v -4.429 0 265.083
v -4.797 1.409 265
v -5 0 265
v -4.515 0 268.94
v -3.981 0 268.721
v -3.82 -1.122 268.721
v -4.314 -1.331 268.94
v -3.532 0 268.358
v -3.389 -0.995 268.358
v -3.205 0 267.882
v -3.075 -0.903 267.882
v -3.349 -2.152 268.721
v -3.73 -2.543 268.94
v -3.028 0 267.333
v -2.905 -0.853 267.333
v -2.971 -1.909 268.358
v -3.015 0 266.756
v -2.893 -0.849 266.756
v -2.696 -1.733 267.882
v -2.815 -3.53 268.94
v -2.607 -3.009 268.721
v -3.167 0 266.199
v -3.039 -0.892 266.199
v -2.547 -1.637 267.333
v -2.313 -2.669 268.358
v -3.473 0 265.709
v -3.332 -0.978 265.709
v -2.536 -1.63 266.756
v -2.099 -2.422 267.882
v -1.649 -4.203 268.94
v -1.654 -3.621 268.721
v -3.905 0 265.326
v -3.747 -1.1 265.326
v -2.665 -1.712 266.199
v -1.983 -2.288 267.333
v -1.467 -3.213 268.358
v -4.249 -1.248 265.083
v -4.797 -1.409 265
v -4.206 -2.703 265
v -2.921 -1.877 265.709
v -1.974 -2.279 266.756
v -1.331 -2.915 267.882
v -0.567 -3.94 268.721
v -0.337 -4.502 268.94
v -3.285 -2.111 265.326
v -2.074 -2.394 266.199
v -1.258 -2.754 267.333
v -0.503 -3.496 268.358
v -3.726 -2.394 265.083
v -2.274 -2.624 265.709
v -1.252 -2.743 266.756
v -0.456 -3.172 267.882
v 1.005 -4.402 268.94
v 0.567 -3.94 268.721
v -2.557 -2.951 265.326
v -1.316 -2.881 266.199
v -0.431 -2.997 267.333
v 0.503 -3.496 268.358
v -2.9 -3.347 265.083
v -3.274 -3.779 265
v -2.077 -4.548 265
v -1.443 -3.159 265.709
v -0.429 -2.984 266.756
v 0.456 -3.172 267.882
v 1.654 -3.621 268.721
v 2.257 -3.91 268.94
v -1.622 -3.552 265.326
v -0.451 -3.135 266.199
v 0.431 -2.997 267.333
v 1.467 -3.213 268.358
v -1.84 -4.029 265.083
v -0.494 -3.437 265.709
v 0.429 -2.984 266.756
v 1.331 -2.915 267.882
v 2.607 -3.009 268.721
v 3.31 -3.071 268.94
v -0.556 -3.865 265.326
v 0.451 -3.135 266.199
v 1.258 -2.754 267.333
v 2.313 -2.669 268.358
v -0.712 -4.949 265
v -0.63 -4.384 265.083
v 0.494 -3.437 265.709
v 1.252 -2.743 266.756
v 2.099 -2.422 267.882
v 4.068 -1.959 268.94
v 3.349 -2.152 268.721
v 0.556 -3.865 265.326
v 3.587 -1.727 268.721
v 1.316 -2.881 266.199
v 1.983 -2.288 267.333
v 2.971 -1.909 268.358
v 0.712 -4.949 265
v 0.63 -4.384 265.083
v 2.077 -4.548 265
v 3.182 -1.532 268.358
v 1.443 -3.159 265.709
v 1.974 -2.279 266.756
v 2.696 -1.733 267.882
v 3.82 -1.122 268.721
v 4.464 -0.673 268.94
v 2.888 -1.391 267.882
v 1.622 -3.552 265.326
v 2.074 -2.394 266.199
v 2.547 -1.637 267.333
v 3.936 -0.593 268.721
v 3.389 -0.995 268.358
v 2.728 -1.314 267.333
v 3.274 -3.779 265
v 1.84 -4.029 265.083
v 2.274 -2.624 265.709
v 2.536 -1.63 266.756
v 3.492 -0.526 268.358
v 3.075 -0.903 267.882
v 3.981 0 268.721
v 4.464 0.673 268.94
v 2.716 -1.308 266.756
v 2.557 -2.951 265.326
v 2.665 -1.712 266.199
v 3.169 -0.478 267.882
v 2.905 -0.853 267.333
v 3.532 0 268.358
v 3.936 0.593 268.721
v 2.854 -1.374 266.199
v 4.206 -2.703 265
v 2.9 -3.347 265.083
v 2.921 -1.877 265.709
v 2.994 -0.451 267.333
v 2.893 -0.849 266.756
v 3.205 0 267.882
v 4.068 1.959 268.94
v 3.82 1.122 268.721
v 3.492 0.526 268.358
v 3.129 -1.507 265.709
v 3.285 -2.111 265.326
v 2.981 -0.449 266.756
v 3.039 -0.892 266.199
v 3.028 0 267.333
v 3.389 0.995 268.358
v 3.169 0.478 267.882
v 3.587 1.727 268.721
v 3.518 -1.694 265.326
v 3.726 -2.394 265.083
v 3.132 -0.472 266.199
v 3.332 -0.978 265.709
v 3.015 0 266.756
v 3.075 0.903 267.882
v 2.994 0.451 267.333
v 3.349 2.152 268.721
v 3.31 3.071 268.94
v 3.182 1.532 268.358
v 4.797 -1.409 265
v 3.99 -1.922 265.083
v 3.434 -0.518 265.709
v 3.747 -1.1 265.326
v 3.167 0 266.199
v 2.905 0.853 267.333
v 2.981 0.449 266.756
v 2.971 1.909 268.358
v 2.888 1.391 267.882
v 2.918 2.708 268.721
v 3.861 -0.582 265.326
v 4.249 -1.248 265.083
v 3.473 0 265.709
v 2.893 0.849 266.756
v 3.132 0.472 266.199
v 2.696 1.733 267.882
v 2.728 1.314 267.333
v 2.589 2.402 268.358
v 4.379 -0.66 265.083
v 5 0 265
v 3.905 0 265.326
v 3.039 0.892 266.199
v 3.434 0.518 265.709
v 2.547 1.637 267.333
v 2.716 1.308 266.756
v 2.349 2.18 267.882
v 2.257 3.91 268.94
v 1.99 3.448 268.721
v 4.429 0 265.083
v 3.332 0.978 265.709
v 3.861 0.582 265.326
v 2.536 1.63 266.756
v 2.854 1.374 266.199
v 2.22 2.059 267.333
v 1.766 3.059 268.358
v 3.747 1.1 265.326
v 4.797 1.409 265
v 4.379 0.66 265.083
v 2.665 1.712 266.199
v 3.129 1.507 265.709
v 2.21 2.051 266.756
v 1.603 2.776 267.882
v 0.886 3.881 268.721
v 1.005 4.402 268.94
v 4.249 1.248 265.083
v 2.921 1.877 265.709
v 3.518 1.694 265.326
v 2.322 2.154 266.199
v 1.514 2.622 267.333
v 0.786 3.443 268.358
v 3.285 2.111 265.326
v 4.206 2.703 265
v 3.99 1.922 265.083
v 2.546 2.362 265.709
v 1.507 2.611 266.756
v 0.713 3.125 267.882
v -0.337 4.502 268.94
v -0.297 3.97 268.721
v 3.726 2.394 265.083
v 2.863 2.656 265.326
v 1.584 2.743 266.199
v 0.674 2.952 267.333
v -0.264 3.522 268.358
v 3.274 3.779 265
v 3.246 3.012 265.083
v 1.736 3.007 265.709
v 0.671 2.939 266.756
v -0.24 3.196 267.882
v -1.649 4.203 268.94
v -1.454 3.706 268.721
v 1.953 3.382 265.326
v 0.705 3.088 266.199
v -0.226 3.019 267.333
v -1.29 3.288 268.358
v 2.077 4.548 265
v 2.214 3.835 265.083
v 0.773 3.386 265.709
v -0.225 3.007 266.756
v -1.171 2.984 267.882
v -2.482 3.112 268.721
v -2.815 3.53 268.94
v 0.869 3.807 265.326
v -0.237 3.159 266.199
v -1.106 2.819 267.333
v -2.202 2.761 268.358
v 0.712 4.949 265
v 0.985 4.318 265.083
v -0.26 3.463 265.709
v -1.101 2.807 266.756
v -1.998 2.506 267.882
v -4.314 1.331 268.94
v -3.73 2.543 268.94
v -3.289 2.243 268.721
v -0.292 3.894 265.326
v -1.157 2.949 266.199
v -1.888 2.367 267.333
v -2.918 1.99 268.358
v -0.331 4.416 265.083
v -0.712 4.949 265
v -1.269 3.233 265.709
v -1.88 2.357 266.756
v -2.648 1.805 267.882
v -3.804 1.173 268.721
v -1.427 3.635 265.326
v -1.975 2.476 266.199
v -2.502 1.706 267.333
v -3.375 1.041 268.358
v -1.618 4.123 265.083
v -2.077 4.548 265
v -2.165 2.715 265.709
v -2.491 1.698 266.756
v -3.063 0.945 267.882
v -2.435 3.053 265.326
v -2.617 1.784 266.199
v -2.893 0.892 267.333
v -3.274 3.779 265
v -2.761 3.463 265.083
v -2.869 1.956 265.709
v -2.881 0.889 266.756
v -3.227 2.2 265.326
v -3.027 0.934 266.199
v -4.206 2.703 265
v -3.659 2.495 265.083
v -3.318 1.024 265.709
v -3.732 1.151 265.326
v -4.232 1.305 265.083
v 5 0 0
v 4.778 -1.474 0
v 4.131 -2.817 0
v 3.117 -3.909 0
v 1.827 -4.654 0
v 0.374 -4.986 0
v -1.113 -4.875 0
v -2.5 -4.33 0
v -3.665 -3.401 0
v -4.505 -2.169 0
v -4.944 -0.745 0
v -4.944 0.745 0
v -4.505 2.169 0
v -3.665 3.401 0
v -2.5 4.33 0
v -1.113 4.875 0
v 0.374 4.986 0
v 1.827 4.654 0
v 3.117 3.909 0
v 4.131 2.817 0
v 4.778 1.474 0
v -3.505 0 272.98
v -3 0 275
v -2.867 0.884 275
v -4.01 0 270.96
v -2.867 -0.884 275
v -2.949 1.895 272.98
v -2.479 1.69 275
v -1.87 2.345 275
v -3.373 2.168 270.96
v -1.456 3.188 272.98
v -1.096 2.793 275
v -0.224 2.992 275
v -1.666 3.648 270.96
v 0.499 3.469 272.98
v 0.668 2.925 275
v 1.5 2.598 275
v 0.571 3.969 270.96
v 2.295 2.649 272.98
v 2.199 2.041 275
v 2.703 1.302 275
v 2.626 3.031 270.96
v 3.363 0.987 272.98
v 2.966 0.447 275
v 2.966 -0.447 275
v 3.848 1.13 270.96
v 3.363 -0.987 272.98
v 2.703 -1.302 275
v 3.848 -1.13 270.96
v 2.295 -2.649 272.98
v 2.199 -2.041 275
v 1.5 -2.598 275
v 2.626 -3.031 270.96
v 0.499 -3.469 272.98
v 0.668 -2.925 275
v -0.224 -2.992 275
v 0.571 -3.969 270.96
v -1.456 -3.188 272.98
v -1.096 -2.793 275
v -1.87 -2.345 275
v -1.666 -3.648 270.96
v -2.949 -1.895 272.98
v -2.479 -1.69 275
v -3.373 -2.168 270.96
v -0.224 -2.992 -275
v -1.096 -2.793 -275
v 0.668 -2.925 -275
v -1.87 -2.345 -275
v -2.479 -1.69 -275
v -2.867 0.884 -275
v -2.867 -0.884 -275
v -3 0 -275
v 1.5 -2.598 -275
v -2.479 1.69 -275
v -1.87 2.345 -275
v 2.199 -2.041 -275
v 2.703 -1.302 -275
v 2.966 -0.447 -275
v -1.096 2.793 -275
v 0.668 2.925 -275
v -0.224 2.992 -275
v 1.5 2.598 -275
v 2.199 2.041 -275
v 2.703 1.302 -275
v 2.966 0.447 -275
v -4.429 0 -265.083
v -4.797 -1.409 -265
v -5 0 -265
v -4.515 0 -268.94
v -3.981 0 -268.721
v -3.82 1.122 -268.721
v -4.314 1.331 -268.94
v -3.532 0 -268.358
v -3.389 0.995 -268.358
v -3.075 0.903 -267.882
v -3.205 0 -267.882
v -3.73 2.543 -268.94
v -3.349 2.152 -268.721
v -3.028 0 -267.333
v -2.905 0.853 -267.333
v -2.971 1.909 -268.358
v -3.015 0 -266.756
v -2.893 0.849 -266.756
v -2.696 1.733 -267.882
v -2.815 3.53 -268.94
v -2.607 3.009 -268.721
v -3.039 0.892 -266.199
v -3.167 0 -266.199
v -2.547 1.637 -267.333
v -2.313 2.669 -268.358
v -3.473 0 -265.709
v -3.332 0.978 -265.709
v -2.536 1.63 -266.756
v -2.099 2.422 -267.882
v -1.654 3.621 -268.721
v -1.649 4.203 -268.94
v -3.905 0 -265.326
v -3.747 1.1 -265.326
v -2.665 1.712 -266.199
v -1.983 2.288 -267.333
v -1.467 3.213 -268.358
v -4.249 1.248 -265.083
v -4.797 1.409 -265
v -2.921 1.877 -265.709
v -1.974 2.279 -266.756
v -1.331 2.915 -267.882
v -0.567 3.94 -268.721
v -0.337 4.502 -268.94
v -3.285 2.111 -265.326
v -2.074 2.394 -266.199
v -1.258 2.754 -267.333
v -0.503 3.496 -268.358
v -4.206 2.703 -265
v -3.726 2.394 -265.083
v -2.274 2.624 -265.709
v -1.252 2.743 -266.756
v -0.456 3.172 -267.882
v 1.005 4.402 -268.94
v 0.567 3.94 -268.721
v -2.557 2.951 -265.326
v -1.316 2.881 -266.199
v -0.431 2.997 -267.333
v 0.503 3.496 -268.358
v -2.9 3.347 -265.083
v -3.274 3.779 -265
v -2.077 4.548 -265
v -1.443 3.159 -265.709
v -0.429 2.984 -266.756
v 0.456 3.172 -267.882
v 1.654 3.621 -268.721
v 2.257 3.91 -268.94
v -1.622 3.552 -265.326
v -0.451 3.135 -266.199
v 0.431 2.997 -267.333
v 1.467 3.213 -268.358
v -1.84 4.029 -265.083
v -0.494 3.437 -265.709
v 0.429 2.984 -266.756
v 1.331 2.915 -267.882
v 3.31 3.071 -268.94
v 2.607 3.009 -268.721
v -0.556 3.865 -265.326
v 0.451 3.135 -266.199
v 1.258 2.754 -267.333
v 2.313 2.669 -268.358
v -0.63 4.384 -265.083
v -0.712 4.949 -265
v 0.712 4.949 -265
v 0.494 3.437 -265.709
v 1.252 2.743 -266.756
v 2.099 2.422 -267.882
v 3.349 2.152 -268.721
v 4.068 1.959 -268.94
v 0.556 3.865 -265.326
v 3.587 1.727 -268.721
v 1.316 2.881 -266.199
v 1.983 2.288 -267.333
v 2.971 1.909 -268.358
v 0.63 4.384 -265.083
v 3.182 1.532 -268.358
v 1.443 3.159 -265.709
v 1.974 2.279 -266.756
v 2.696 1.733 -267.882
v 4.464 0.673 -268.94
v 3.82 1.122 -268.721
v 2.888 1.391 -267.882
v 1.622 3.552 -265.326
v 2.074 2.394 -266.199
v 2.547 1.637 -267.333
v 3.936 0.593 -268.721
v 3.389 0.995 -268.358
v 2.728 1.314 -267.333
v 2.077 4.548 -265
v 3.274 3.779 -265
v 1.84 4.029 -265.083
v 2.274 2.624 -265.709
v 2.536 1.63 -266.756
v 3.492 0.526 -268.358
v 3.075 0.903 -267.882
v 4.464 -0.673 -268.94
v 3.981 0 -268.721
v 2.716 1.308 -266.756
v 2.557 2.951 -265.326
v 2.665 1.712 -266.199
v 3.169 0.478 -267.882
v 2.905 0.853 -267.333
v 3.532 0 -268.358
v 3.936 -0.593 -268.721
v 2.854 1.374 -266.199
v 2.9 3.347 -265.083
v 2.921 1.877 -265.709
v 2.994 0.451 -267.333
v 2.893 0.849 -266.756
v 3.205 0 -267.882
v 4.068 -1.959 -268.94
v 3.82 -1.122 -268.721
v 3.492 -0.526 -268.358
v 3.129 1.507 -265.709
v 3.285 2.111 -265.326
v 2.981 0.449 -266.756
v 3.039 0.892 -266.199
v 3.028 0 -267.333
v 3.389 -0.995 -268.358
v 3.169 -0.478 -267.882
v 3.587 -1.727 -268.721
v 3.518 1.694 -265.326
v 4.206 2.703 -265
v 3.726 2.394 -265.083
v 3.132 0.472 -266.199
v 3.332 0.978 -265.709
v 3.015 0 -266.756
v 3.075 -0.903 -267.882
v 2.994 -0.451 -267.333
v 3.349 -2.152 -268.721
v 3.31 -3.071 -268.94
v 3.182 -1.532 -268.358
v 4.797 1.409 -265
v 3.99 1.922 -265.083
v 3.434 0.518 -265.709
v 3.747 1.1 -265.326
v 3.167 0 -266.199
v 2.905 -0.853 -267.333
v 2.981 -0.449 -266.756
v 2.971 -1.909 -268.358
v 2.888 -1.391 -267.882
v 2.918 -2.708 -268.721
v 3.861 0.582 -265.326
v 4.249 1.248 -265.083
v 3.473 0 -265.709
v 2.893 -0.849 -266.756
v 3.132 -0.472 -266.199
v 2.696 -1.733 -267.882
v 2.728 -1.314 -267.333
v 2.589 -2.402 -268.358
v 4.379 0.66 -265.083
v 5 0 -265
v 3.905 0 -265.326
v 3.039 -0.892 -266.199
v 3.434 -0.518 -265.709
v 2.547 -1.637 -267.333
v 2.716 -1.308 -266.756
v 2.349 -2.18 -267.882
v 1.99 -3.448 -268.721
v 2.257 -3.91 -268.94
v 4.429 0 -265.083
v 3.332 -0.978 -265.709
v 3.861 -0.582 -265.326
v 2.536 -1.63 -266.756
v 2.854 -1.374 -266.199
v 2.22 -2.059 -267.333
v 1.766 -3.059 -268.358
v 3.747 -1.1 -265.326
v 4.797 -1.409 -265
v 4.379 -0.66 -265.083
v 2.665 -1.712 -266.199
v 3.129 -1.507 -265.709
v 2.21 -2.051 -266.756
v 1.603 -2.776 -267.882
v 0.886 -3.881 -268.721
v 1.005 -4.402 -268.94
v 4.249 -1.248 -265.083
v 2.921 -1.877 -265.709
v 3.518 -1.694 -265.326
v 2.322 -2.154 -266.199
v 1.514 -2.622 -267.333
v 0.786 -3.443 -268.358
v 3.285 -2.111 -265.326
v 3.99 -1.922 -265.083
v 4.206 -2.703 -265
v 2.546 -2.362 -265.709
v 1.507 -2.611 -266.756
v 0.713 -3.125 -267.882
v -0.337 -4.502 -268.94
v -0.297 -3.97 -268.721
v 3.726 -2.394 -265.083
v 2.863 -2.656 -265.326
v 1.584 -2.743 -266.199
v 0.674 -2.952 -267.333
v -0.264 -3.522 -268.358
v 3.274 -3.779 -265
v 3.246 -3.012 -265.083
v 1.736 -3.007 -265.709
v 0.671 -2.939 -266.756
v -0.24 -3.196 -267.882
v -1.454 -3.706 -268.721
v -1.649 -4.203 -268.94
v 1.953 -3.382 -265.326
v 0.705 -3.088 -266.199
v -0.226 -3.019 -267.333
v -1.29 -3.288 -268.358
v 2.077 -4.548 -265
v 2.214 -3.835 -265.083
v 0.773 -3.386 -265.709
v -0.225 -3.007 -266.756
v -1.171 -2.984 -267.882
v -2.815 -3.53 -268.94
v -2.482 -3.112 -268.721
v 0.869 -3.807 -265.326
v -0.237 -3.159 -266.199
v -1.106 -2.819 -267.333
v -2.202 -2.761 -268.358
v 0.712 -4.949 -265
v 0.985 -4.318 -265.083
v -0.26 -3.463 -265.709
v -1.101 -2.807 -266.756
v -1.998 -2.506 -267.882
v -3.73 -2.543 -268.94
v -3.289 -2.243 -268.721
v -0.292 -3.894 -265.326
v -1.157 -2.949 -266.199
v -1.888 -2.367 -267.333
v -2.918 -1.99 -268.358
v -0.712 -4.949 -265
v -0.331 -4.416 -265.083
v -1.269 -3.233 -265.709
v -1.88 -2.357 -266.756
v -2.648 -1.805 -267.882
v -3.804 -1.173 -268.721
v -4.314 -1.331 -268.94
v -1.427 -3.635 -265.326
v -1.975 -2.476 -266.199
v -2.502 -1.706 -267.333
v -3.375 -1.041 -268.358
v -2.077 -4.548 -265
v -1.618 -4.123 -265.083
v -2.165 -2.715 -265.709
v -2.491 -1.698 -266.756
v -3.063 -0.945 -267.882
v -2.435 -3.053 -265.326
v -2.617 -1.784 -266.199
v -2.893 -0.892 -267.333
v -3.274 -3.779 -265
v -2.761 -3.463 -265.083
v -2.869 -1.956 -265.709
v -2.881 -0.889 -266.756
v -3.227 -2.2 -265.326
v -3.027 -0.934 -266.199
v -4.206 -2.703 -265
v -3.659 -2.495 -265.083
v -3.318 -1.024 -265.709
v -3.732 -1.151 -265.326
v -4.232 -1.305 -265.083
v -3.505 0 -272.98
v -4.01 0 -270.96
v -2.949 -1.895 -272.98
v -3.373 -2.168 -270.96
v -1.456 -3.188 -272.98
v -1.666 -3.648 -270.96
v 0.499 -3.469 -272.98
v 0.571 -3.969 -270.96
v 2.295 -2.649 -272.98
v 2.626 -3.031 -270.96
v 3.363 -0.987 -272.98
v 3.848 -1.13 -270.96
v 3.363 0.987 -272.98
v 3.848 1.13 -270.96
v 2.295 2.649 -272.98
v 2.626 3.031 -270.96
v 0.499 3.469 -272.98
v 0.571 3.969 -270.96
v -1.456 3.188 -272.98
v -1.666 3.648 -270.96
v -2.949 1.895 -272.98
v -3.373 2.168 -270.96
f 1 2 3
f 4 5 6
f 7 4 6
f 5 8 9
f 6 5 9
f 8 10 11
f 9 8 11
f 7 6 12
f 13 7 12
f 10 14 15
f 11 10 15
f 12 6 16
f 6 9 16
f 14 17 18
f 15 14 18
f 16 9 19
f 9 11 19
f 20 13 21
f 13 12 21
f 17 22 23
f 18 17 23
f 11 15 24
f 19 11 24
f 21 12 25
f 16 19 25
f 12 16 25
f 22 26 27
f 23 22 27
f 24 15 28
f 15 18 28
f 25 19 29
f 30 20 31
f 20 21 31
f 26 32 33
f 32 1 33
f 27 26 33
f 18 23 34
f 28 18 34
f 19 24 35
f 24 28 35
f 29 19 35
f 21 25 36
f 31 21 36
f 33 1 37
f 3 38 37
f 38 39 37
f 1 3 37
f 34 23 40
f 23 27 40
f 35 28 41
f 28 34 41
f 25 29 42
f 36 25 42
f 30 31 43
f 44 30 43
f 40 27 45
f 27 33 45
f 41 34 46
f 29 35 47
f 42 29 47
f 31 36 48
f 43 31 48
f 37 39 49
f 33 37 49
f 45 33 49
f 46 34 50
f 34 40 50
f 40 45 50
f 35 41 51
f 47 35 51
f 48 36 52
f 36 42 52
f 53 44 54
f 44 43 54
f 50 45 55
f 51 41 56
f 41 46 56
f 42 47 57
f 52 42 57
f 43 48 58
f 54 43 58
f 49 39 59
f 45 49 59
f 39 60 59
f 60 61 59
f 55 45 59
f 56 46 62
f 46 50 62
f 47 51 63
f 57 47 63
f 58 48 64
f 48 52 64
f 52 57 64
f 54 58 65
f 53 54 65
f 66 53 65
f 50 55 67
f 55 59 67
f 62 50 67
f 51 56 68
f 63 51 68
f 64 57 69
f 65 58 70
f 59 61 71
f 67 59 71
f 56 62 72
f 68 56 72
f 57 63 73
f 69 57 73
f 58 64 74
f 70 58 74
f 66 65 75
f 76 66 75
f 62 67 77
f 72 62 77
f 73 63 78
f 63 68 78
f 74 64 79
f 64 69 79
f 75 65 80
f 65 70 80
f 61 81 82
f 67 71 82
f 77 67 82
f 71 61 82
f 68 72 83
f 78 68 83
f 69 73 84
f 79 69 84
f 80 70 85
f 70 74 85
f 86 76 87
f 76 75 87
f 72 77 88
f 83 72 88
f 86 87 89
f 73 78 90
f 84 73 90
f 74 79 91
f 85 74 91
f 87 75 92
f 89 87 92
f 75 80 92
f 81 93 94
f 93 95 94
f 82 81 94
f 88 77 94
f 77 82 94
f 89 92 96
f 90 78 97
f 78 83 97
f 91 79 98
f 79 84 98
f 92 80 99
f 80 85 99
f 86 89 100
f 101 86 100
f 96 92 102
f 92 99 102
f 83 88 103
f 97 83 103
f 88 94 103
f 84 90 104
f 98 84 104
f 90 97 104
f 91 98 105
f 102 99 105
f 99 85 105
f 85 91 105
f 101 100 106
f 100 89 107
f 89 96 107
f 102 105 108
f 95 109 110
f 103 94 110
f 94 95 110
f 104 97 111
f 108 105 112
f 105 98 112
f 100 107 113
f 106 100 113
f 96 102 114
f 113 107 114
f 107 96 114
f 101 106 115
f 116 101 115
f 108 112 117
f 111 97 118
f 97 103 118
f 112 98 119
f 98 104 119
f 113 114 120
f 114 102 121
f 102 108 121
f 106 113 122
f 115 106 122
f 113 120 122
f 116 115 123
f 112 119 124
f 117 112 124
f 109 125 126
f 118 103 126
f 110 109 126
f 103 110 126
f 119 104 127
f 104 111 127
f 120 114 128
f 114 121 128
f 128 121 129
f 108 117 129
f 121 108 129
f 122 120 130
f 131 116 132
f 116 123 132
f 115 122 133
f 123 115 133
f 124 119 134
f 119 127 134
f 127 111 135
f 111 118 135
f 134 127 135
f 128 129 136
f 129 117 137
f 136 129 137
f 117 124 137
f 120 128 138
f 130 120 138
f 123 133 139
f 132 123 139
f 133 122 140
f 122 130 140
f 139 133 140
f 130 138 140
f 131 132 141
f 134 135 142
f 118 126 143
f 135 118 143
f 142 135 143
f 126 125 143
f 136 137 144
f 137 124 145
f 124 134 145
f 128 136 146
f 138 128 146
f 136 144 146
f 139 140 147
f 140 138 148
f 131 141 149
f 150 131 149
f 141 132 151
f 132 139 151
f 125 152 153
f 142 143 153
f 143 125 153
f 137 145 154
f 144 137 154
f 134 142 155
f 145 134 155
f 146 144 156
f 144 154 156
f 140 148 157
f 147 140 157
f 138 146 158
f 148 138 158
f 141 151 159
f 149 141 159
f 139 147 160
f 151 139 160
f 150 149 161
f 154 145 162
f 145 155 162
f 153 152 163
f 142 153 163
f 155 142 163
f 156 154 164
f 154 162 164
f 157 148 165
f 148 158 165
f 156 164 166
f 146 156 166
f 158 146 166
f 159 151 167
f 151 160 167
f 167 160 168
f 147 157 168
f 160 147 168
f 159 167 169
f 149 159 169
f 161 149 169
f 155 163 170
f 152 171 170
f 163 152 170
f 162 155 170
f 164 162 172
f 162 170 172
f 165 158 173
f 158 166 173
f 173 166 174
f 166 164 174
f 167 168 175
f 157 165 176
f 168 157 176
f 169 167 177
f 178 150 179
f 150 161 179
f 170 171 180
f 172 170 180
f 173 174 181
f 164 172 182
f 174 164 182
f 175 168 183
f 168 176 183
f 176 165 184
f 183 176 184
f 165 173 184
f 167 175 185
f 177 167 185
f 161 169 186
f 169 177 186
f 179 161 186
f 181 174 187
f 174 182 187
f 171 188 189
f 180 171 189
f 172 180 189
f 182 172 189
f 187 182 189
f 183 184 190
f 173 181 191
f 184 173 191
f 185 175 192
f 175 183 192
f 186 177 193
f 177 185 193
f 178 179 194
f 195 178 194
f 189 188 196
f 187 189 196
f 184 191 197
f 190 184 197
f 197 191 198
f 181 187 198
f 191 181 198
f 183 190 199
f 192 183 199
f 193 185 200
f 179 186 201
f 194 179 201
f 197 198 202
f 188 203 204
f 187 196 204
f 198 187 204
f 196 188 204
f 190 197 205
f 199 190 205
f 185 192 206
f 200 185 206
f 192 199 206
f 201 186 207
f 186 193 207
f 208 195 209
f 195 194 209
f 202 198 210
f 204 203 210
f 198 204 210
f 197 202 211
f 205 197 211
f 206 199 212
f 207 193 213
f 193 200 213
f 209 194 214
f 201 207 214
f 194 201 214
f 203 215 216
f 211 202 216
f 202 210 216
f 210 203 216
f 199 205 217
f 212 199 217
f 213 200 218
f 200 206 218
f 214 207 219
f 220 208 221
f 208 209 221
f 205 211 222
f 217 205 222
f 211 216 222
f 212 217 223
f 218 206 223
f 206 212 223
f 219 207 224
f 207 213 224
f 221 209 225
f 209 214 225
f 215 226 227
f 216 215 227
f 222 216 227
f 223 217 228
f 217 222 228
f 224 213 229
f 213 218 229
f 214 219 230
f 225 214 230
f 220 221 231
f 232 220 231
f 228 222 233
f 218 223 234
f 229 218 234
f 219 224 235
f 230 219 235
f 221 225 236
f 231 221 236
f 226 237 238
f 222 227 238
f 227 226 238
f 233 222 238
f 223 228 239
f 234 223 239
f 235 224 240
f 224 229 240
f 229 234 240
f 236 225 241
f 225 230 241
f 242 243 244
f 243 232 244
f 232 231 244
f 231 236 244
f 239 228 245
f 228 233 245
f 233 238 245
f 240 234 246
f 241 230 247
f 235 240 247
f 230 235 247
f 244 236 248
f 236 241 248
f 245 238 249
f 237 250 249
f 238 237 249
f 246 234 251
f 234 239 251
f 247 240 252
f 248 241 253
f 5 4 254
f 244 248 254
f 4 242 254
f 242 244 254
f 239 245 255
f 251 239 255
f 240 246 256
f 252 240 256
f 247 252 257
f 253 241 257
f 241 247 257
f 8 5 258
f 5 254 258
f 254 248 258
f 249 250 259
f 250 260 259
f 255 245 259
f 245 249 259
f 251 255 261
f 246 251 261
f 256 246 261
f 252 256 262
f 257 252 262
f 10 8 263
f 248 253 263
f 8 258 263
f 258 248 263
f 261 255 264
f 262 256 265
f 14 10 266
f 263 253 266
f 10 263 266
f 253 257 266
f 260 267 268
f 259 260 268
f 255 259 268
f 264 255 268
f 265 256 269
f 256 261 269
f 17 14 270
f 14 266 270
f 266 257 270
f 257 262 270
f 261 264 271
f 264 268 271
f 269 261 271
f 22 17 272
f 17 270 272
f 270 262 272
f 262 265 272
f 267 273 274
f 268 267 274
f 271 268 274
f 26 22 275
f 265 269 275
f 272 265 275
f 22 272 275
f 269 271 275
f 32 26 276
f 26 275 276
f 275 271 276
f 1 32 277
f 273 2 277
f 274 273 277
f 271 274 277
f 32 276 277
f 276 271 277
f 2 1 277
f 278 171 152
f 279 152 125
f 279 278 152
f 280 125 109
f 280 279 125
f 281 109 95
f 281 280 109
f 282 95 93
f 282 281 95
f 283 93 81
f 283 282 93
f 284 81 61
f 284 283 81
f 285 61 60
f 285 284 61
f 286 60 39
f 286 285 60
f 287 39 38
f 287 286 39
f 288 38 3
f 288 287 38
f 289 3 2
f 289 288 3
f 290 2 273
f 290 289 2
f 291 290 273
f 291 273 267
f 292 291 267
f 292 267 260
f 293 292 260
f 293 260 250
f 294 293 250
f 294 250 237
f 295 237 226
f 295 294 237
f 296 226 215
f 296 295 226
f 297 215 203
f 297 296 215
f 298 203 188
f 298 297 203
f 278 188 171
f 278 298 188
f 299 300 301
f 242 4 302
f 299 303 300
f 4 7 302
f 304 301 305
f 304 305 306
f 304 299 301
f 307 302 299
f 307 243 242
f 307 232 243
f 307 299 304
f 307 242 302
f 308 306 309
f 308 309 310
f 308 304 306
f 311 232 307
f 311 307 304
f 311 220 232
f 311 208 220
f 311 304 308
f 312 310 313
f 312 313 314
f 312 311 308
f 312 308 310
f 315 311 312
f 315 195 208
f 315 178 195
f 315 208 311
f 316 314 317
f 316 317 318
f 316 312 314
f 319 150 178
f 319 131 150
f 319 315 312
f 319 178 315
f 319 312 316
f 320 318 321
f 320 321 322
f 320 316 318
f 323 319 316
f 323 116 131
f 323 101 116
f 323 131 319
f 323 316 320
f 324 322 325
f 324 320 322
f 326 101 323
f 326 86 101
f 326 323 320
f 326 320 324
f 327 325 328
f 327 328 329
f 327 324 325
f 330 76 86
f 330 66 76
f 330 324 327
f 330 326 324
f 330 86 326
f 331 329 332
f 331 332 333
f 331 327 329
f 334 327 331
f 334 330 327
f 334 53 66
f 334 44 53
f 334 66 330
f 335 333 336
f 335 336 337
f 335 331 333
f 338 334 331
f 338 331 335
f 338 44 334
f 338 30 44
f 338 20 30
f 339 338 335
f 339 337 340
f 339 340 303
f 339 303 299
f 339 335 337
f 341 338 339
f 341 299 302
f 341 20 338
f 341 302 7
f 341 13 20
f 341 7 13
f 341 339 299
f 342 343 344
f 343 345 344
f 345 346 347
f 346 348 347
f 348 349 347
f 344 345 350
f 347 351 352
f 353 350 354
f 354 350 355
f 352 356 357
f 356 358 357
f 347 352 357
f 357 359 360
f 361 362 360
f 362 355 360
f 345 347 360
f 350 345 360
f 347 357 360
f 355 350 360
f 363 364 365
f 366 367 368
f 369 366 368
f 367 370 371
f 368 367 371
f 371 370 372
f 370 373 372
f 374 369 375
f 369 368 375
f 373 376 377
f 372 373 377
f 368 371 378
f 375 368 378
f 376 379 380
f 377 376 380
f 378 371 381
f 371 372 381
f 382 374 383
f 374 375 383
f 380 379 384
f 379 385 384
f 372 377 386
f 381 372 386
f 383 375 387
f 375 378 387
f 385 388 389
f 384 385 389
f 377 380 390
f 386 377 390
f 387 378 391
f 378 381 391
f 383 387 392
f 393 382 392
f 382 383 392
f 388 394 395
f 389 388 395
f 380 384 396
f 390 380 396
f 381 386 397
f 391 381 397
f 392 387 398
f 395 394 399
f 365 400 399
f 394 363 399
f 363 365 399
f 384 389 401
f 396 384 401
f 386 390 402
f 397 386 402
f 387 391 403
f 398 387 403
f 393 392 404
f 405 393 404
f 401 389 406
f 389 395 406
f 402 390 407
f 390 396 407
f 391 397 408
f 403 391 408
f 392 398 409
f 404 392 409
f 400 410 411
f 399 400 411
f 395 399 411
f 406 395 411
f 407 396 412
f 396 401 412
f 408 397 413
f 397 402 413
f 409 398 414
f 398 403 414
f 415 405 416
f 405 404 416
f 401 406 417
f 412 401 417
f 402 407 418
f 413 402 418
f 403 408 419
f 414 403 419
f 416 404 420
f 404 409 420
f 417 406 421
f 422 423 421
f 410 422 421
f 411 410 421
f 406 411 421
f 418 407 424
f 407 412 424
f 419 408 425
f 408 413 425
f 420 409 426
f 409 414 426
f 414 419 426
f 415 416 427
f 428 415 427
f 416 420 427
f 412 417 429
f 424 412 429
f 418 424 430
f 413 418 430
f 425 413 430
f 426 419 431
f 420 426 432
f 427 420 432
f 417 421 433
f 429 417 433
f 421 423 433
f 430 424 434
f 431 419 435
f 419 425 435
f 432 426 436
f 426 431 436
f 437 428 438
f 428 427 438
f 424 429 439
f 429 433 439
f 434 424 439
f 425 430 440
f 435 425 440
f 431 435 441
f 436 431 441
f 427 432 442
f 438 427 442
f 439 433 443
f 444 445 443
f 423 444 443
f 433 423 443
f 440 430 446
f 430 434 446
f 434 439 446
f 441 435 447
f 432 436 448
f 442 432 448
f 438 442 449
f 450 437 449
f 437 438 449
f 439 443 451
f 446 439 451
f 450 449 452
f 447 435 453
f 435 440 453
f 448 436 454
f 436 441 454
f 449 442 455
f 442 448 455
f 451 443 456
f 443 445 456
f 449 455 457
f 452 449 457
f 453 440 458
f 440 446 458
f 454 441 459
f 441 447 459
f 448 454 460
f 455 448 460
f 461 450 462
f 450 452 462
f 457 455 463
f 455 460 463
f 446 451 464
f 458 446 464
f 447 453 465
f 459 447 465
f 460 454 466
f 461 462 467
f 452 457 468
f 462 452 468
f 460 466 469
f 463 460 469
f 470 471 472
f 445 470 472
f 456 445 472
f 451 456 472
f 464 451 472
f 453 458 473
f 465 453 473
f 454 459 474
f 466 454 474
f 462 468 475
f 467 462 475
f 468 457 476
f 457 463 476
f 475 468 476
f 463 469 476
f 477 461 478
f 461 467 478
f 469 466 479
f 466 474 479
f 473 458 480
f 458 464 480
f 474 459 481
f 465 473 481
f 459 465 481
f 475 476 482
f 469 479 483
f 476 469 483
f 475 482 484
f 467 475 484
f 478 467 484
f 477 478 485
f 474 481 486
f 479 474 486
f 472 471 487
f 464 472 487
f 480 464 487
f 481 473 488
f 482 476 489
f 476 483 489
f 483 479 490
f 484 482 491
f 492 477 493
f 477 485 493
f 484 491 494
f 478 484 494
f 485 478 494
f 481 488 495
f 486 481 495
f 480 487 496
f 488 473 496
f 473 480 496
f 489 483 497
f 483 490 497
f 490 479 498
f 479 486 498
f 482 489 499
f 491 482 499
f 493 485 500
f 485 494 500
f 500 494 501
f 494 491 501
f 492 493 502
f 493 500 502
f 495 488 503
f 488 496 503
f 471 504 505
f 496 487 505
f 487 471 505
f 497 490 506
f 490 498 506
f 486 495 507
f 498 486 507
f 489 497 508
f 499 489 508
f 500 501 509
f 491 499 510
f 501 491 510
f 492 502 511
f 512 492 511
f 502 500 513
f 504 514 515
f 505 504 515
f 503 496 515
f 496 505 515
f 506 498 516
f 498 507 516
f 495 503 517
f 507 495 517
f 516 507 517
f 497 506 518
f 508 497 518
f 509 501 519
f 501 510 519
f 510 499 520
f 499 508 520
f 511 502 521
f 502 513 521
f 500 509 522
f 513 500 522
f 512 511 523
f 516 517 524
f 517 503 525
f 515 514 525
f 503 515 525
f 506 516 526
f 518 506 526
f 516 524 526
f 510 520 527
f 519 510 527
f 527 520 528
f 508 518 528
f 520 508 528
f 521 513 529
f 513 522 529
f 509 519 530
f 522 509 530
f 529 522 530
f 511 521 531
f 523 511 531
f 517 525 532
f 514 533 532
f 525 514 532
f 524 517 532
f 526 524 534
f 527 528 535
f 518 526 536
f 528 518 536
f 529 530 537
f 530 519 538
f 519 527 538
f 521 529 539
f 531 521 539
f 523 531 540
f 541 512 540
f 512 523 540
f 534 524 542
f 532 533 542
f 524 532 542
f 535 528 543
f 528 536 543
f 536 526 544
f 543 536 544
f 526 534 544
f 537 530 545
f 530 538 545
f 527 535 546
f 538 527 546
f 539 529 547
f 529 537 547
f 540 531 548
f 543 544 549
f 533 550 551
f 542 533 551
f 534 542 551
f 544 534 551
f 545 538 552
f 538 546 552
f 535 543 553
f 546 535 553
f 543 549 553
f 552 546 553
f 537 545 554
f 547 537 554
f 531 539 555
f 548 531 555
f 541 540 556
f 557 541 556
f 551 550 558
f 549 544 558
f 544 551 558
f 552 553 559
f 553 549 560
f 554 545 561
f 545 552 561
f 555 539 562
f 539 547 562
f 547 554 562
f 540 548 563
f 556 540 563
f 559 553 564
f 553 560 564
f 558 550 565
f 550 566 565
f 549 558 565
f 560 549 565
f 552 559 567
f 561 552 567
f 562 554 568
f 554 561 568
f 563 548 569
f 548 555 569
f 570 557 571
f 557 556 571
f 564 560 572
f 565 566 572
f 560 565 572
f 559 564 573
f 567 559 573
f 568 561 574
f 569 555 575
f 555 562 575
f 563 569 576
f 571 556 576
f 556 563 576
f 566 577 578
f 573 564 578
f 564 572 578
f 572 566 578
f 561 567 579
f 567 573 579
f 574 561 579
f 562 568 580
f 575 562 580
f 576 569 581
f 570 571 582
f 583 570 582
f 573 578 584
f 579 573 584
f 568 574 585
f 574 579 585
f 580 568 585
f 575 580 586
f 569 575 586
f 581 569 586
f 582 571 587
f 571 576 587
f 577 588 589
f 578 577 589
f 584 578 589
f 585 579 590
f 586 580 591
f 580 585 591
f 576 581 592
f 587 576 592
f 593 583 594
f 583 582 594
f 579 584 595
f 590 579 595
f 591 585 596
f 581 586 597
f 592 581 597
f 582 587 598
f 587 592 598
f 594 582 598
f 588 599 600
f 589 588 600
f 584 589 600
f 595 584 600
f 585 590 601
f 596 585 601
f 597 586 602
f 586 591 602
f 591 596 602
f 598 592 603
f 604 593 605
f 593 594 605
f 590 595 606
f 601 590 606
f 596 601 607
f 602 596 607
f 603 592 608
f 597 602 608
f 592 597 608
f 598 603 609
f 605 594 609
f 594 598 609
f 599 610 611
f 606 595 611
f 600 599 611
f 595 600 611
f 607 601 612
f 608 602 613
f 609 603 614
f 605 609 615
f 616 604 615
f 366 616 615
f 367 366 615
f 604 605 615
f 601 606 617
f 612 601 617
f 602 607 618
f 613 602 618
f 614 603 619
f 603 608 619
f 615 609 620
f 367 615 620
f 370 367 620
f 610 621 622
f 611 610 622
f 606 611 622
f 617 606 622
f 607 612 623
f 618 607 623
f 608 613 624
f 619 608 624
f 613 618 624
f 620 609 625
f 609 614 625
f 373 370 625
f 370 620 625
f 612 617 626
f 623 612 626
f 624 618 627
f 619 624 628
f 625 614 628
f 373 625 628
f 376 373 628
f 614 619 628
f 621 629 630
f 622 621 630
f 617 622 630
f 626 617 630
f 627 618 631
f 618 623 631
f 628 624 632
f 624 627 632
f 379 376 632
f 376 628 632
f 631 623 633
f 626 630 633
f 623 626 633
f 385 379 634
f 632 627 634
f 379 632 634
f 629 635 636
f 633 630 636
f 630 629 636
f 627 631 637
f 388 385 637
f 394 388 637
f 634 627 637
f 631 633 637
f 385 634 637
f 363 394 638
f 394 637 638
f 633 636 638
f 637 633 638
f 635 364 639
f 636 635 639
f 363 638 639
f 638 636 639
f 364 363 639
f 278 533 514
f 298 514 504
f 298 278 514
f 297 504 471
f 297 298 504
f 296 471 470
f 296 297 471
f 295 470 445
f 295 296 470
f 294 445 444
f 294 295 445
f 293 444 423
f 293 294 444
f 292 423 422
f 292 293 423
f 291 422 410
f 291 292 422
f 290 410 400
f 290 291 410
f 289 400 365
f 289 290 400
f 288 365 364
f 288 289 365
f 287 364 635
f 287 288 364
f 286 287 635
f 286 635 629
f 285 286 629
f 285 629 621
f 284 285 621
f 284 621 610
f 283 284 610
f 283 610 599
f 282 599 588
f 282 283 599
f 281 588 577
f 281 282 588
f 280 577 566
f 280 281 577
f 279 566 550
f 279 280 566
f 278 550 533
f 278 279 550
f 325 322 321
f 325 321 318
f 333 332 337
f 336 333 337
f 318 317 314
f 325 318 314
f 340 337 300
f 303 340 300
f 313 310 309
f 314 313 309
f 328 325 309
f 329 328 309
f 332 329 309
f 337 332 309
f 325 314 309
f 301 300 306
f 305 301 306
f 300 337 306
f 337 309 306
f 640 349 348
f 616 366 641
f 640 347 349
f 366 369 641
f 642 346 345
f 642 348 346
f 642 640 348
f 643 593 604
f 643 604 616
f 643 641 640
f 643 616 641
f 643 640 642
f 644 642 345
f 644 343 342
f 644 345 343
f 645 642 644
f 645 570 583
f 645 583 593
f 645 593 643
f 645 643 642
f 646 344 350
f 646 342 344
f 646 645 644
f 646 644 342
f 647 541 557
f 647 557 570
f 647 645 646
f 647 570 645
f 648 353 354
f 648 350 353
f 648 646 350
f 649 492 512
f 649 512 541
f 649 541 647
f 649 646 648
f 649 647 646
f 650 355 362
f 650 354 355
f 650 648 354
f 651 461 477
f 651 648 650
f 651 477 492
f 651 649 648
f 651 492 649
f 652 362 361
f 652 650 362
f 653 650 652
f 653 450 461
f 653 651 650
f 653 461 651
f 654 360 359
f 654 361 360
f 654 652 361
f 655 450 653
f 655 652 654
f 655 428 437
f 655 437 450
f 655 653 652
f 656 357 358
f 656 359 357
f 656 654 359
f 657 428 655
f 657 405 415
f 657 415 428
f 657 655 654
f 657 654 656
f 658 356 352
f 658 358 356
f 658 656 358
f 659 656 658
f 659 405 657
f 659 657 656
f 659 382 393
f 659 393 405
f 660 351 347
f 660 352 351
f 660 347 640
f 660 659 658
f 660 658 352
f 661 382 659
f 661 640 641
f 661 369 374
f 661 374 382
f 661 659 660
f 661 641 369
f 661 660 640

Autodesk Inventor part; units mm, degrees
ref_plane "YZ Plane" through (0, 0, 0) normal (1, 0, 0) x (0, 1, 0)
ref_plane "XZ Plane" through (0, 0, 0) normal (0, 1, 0) x (-1, 0, 0)
ref_plane "XY Plane" through (0, 0, 0) normal (0, 0, 1) x (1, 0, 0)
sketch "草图1" plane through (0, 0, 0) normal (0, 0, 1) x (1, 0, 0)
  circle A0 centre (0, 0) radius 5
  dimension "d0" = 10
extrude "拉伸1" add sketch "草图1" along normal mid plane 530
sketch "草图2" plane through (0, 0, 0) normal (0, 1, 0) x (-1, 0, 0)
  arc A0 (4.5149, 268.9403) -> (5, 265) centre (5, 267) ccw
  line L0 (5, 265) -> (-5, 265) projected
  line L1 (3, 275) -> (4.5149, 268.9403)
  line L2 (3, 275) -> (0, 275)
  line L3 (0, 275) -> (0, 265)
  line L4 (5, 265) -> (0, 265)
  point P0 (0, 0)
  dimension "d4" = 2
  dimension "d5" = 2
  dimension "d7" = 10
  dimension "d10" = 5
  dimension "d11" = 3
revolve "旋转1" add sketch "草图2" angle 360 about axis through (0, 0, 275) along (0, 0, -1)
mirror "镜像1" about plane through (0, 0, 0) normal (0, 0, 1) of "旋转1"
properties part number "载板连接销"
